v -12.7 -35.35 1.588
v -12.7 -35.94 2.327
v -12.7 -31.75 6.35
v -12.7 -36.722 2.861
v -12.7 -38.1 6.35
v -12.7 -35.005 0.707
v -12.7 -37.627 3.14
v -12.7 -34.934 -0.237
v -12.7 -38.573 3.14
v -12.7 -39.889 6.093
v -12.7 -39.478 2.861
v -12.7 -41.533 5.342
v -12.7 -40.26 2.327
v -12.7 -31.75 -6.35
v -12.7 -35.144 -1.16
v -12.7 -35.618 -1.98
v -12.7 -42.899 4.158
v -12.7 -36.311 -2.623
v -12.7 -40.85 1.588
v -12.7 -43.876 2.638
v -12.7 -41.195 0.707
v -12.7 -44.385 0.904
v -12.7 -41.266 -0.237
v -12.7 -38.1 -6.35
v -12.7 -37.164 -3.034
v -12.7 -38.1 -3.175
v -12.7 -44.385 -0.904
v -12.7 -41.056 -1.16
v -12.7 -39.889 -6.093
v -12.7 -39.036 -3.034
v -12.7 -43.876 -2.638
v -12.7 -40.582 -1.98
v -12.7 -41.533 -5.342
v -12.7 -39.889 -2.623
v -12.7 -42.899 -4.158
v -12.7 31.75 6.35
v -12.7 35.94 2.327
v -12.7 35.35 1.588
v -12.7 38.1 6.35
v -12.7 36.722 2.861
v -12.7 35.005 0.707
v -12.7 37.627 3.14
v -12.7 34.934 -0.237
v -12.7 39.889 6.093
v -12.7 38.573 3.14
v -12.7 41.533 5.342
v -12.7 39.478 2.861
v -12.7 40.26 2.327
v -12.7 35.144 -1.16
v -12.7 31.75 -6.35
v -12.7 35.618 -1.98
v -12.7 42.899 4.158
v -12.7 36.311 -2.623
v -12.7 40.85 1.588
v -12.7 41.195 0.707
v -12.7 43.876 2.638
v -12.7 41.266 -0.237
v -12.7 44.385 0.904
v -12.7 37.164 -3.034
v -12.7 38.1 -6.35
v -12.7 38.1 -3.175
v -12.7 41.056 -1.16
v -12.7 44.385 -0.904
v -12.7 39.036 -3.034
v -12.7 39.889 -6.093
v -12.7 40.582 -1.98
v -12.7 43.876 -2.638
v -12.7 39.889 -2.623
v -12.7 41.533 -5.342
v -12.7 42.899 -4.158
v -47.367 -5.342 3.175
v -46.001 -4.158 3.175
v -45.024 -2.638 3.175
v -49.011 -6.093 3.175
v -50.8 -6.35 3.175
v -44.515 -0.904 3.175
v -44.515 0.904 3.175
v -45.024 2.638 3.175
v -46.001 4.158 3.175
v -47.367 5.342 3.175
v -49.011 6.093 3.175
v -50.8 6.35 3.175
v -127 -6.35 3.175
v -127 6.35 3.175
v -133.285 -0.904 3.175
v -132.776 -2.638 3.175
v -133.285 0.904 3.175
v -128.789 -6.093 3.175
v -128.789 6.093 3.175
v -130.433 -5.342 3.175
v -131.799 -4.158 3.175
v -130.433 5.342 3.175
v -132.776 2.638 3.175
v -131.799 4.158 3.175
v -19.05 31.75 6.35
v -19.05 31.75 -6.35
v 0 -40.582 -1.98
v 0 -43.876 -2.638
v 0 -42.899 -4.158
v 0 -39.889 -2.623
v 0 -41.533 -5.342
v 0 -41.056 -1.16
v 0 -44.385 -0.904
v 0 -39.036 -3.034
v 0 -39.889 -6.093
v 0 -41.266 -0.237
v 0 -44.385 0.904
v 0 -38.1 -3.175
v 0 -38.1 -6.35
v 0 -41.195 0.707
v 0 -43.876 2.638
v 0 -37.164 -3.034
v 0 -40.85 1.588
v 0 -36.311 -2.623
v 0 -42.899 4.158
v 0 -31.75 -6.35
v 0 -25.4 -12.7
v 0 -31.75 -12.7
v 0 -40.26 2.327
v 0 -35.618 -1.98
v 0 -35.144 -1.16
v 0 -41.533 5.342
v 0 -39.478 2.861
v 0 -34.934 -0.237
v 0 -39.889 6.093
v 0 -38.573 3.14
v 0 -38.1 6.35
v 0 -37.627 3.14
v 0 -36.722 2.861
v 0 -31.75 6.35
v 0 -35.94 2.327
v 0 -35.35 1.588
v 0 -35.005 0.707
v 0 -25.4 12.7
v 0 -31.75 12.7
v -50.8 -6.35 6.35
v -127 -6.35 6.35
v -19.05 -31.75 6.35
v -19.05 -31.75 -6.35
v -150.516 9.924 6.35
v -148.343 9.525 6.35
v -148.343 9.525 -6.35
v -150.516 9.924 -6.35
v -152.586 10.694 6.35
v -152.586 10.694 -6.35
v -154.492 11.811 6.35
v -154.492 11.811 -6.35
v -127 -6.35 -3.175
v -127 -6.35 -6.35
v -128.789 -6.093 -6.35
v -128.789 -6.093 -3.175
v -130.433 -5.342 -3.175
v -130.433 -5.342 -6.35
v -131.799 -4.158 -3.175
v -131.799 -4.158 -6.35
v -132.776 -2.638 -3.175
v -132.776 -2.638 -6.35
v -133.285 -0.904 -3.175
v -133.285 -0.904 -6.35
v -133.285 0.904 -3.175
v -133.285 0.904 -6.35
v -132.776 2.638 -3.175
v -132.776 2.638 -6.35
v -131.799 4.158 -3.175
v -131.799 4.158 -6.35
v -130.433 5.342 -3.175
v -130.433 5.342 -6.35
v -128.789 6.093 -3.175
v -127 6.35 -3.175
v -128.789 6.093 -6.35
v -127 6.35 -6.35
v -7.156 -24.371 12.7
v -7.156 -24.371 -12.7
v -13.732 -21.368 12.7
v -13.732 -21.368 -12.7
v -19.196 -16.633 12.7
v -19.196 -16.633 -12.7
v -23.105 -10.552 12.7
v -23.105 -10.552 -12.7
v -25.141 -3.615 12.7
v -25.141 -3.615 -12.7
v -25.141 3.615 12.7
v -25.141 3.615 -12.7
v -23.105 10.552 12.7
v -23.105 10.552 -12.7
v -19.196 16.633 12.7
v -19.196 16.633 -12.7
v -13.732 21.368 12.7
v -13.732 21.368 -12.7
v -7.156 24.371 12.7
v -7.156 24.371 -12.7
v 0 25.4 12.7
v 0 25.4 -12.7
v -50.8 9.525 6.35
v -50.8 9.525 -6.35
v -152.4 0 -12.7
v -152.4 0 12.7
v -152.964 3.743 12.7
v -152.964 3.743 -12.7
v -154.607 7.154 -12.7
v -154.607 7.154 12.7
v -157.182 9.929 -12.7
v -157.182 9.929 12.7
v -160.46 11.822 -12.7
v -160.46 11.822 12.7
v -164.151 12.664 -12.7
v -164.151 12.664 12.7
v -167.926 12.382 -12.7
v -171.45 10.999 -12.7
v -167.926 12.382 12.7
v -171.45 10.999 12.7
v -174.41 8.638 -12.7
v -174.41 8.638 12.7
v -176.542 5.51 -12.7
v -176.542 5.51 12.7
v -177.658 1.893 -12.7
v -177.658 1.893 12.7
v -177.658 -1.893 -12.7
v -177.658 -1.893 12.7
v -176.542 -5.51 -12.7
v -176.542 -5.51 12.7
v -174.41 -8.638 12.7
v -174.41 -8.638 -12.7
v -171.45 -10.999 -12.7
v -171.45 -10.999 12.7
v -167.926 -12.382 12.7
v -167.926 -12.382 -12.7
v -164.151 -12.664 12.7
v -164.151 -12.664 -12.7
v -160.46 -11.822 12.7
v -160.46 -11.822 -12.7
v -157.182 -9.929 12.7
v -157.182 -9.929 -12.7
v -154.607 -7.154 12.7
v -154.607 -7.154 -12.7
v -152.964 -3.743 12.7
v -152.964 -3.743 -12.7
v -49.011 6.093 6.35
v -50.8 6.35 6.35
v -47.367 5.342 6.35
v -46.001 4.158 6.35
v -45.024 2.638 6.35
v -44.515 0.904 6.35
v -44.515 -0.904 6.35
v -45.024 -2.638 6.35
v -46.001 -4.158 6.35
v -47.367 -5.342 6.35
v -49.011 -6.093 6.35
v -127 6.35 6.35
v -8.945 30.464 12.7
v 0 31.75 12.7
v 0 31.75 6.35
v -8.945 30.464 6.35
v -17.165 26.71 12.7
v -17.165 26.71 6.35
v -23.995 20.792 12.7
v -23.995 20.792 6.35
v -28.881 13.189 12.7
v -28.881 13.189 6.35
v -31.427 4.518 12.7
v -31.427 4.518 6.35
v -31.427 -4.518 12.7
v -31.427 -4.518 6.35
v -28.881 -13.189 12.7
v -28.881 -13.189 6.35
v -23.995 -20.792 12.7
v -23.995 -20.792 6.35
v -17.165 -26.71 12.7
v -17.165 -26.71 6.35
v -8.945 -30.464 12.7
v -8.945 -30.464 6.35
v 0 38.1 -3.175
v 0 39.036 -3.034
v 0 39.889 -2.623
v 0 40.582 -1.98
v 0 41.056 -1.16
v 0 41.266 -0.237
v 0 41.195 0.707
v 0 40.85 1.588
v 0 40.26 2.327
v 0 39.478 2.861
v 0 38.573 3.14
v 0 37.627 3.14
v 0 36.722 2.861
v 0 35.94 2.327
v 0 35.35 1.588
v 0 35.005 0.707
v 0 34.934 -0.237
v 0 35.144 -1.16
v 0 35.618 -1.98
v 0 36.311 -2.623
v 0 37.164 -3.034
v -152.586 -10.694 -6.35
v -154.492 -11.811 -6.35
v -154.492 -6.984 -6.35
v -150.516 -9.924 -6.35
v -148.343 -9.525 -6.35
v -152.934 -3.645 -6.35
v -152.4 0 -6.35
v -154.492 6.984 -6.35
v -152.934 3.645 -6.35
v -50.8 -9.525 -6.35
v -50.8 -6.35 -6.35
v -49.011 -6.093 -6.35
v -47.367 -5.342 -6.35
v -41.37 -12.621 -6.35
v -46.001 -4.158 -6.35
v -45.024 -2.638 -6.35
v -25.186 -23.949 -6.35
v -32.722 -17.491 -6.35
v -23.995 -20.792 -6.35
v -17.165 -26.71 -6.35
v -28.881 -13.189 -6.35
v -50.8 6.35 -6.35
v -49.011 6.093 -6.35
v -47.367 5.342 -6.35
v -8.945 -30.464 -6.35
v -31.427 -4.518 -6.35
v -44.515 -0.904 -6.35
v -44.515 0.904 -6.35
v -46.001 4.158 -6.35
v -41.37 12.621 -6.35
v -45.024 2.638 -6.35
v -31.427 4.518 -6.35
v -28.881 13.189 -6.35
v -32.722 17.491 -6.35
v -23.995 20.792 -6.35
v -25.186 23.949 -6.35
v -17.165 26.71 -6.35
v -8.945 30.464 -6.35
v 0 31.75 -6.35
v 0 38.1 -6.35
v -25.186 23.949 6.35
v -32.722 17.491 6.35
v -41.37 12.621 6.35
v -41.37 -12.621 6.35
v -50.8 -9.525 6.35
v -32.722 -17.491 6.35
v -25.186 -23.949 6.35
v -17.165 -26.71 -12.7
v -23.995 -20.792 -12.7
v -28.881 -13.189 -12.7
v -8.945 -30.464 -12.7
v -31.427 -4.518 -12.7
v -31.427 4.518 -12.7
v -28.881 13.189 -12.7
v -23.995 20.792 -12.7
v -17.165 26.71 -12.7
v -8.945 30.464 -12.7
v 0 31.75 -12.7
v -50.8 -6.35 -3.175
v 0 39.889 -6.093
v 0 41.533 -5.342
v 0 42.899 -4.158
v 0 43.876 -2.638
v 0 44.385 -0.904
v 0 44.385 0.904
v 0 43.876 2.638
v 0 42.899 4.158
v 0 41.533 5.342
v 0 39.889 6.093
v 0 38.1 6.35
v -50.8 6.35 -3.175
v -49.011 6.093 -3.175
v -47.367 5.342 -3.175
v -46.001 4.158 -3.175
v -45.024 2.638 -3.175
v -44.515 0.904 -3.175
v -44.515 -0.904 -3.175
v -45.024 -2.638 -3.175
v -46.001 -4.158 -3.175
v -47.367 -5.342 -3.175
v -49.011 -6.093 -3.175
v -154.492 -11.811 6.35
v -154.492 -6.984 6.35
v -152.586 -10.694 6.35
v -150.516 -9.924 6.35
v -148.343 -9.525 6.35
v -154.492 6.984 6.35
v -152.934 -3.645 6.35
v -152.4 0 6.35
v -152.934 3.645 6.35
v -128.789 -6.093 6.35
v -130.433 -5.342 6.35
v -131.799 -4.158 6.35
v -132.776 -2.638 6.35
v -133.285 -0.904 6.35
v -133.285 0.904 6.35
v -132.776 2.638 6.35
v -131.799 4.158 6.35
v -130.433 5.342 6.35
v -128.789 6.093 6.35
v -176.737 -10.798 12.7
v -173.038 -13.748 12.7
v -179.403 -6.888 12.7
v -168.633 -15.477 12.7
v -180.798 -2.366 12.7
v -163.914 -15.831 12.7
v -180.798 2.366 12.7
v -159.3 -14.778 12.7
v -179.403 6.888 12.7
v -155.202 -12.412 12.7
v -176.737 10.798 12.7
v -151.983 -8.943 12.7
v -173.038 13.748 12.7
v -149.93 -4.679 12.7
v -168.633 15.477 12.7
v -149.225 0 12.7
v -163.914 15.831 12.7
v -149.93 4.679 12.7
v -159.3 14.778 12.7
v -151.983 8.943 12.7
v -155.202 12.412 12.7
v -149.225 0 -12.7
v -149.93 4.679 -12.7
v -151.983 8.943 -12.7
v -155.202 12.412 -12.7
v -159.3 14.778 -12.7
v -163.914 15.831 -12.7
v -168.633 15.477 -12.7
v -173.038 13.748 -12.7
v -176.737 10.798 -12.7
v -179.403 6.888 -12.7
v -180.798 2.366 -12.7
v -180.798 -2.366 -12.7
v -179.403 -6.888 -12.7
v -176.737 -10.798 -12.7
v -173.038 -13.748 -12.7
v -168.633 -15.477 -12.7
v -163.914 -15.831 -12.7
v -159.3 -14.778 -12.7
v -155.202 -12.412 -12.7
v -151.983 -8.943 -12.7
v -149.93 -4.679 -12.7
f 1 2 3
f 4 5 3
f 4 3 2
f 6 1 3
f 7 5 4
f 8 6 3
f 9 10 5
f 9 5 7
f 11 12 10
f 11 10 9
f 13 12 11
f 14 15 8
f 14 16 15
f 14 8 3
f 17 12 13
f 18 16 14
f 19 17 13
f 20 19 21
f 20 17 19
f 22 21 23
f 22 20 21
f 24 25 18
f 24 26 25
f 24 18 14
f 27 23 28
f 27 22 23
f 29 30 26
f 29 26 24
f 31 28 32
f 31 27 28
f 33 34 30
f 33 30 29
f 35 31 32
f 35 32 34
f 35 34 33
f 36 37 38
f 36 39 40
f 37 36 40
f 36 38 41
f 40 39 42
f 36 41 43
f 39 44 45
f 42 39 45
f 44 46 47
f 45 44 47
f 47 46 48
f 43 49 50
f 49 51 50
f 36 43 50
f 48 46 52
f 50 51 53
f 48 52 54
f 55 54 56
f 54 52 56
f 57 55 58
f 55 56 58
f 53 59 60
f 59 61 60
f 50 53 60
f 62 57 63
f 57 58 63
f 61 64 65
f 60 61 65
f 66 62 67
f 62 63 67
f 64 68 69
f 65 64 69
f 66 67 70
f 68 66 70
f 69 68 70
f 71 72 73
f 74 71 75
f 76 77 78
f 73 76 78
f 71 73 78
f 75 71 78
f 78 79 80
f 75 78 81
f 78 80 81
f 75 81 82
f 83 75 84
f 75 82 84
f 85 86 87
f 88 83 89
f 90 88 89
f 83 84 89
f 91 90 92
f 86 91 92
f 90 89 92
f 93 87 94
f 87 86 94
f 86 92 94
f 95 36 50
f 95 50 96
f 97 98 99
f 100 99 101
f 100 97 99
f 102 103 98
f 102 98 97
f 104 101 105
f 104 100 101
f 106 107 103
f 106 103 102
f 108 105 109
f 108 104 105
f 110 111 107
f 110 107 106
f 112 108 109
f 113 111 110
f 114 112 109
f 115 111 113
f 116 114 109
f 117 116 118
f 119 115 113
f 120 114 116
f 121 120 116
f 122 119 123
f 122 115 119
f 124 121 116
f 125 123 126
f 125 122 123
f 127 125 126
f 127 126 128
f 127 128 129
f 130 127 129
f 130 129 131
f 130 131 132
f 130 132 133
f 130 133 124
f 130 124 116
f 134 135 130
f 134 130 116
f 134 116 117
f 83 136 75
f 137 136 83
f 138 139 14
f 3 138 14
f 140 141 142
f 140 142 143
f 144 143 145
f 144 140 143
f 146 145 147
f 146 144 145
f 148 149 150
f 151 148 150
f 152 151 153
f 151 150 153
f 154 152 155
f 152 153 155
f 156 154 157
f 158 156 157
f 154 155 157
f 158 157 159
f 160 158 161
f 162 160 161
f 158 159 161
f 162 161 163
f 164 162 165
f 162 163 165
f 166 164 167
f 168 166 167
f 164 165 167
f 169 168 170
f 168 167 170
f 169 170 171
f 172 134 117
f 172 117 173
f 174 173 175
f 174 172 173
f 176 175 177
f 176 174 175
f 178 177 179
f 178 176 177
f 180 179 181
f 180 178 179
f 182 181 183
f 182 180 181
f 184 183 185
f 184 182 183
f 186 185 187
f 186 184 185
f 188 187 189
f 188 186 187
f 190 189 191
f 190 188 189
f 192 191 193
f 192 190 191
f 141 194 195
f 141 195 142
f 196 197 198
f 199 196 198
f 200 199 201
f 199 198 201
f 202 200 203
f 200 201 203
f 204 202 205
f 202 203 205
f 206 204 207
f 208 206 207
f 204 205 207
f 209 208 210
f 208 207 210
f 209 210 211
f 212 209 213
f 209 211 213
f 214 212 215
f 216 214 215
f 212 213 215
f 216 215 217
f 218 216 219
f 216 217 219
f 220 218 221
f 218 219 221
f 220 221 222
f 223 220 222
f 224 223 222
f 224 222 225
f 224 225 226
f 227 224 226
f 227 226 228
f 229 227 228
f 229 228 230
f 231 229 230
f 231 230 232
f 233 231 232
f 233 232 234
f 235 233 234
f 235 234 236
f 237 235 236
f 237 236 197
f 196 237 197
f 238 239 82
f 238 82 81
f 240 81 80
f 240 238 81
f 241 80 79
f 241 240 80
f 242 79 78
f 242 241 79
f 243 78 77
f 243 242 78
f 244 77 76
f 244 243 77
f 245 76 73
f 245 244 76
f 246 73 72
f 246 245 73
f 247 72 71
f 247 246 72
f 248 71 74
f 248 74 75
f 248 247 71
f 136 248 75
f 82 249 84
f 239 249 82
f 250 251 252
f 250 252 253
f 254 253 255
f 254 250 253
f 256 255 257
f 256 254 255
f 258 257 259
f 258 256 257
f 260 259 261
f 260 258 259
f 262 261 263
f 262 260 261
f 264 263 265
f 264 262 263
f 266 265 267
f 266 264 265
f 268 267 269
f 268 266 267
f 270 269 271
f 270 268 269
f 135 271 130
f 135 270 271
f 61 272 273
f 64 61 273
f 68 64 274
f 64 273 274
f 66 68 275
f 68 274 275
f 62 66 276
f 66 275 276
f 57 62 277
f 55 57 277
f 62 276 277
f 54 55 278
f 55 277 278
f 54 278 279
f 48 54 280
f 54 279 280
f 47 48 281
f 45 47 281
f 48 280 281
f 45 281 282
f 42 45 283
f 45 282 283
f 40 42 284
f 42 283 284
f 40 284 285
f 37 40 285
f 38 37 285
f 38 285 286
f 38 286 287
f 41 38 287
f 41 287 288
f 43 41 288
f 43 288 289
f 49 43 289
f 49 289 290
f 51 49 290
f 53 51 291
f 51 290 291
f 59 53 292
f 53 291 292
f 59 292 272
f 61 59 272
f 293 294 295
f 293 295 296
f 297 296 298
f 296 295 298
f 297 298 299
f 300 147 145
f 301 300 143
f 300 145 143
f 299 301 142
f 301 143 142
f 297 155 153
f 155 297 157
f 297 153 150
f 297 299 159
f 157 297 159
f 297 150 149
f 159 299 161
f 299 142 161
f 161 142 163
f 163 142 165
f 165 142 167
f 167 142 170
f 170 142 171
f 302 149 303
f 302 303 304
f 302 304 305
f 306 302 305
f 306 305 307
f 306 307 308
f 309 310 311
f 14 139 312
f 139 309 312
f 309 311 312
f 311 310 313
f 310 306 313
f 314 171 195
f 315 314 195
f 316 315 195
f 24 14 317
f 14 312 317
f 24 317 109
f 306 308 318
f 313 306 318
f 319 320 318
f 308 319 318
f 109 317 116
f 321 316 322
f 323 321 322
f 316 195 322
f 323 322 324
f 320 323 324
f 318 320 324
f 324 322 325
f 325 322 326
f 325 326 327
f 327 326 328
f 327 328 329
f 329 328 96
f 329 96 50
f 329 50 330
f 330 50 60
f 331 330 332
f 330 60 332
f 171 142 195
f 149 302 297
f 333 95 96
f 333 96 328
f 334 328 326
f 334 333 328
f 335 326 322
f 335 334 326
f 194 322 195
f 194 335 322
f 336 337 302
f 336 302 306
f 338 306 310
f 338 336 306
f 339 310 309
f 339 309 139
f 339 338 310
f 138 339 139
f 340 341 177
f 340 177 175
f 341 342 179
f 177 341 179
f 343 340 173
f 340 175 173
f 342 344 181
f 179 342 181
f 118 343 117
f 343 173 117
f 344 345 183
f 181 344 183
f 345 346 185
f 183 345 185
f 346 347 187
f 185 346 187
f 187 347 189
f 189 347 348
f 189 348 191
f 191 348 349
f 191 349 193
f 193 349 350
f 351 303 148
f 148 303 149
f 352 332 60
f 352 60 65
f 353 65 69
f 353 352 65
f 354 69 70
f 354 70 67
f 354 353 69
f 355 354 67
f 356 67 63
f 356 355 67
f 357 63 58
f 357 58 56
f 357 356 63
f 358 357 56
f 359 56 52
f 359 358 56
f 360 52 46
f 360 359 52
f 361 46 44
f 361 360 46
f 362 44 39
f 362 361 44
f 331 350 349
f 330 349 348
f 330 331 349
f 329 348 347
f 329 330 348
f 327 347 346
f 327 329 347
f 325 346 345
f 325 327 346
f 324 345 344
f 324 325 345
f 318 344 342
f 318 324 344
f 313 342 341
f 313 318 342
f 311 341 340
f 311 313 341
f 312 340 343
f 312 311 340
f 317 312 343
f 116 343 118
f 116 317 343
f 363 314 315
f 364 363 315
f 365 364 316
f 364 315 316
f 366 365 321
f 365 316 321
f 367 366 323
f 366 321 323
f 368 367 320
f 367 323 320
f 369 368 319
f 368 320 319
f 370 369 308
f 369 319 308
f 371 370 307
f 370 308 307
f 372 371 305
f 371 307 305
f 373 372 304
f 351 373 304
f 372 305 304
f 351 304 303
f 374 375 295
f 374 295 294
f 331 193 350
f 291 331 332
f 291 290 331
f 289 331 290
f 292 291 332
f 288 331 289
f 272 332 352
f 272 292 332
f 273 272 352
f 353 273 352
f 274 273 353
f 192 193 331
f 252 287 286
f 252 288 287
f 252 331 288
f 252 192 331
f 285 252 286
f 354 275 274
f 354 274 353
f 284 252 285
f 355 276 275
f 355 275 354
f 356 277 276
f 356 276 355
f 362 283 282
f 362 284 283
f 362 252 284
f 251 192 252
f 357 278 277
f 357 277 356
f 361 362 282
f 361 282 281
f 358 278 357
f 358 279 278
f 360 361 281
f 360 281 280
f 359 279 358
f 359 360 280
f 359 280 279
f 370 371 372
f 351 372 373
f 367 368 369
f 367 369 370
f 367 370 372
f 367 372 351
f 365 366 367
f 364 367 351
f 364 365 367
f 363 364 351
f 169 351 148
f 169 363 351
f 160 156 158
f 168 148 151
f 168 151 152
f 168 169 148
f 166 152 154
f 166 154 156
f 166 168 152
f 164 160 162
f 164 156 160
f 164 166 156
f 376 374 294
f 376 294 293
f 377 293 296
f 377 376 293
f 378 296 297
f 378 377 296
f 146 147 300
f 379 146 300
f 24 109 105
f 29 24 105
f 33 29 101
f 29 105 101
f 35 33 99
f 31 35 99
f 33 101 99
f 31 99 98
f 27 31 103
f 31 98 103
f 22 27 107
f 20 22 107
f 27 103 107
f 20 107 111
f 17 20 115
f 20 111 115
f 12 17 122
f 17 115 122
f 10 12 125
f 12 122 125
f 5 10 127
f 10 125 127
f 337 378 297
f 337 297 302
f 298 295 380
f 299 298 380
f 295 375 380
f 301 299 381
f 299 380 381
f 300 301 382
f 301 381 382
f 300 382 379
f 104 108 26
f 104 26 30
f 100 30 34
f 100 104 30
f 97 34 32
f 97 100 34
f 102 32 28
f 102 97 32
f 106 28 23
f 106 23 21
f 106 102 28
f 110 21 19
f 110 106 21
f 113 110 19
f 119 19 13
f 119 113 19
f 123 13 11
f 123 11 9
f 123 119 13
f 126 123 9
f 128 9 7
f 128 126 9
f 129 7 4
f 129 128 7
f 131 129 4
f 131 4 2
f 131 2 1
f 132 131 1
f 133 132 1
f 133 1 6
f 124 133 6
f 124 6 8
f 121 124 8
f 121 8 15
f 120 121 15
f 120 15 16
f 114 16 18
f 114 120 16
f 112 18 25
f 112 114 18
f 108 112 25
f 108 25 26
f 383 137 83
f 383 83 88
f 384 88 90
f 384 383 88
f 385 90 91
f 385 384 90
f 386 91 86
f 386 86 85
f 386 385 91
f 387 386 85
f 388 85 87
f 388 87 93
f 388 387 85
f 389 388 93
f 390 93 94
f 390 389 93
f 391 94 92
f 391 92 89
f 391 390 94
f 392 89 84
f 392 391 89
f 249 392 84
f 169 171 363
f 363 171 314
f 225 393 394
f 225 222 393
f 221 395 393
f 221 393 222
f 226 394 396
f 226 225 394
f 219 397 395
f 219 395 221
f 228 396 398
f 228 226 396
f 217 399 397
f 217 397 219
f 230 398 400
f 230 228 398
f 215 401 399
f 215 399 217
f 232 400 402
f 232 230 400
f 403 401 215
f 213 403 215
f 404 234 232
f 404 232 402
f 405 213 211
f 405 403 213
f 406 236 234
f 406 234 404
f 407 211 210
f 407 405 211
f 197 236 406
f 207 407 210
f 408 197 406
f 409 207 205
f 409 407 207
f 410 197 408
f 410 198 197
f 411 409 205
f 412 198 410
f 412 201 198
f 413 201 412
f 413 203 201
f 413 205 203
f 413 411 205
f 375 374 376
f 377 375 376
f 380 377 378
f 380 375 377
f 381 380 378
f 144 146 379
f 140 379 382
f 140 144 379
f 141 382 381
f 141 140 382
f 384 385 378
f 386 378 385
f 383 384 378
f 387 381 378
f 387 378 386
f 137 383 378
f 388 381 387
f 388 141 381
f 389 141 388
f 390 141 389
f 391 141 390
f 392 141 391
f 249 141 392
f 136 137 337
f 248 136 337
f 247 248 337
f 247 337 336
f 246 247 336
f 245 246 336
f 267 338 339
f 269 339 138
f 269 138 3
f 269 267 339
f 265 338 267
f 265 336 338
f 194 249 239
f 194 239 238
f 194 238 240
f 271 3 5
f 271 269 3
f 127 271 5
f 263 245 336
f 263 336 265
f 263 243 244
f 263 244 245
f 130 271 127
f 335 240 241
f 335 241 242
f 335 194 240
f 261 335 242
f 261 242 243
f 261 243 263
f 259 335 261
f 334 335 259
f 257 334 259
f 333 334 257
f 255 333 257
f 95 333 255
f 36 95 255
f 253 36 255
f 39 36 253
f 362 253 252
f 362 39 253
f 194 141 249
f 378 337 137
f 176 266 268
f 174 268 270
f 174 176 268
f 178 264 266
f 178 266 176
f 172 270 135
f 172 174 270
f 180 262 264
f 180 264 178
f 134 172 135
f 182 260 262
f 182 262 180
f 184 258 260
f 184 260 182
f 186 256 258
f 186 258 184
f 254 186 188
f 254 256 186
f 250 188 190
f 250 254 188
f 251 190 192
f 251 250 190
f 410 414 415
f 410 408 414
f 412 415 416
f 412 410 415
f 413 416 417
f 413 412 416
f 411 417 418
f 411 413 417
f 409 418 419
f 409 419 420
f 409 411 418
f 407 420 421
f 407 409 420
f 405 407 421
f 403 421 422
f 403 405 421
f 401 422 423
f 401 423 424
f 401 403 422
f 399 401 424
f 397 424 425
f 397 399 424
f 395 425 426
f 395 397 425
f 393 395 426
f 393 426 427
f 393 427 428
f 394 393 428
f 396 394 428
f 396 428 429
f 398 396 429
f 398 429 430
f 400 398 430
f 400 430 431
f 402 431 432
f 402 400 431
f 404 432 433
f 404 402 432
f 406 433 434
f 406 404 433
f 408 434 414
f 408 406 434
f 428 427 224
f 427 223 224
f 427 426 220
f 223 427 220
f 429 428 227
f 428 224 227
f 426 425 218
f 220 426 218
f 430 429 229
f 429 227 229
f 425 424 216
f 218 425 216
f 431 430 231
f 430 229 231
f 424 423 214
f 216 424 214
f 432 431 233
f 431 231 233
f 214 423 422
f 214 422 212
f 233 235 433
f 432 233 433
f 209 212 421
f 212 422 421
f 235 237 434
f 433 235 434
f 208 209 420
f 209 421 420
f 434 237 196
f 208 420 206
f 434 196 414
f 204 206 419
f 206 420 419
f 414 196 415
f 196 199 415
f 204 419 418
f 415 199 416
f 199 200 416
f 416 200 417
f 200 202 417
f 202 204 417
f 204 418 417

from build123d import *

# Parameters (mm, degrees)
SKETCH2_R             = 31.75
BOSS_EXTRUDE2_DEPTH   = 12.7
SKETCH2_R_2           = 15.875
BOSS_EXTRUDE2_2_DEPTH = 12.7
BOSS_EXTRUDE3_START   = -6.35
BOSS_EXTRUDE3_DEPTH   = 12.7
CUT_EXTRUDE1_DEPTH    = 3.175
SKETCH5_R             = 12.7
CUT_EXTRUDE2_DEPTH    = 26.4
BOSS_EXTRUDE4_DEPTH   = 12.7
SKETCH7_R             = 3.175
CUT_EXTRUDE3_DEPTH    = 12.7


with BuildPart() as part:
    # Sketch2 → Boss-Extrude2 (new body, symmetric)
    with BuildSketch(Plane.XY):
        Circle(SKETCH2_R)
    extrude(amount=BOSS_EXTRUDE2_DEPTH, both=True)


with BuildPart() as body_2:
    # Sketch2 → Boss-Extrude2 2 (new body, symmetric)
    with BuildSketch(Plane.XY):
        with Locations((-165.1, 0)):
            Circle(SKETCH2_R_2)
    extrude(amount=BOSS_EXTRUDE2_2_DEPTH, both=True)


with BuildPart() as body_3:
    # Sketch3 → Boss-Extrude3 (new body)
    with BuildSketch(Plane.XY.offset(12.7).offset(BOSS_EXTRUDE3_START)):
        with BuildLine():
            Line((0, 31.75), (-19.05, 31.75))
            ThreePointArc((-19.05, 31.75), (-32.7222642, 17.490734571), (-50.8, 9.525))
            Line((-50.8, 9.525), (-148.343009524, 9.525))
            ThreePointArc((-148.343009524, 9.525), (-151.567861624, 10.263966545), (-154.492422733, 11.810797159))
            Line((-154.492422733, 11.810797159), (-154.492422733, -11.810797159))
            ThreePointArc((-154.492422733, -11.810797159), (-151.567861624, -10.263966545), (-148.343009524, -9.525))
            Line((-148.343009524, -9.525), (-50.8, -9.525))
            ThreePointArc((-50.8, -9.525), (-32.7222642, -17.490734571), (-19.05, -31.75))
            Line((-19.05, -31.75), (0, -31.75))
            Line((0, -31.75), (0, 31.75))
        make_face()
    extrude(amount=-BOSS_EXTRUDE3_DEPTH)

    # Sketch4 → Cut-Extrude1 (cut)
    with BuildSketch(Plane.XY.offset(6.35)):
        with BuildLine():
            Line((-127, 6.35), (-50.8, 6.35))
            ThreePointArc((-50.8, 6.35), (-44.45, 0), (-50.8, -6.35))
            Line((-50.8, -6.35), (-127, -6.35))
            ThreePointArc((-127, -6.35), (-133.35, 0), (-127, 6.35))
        make_face()
    cut_extrude1 = extrude(amount=-CUT_EXTRUDE1_DEPTH, mode=Mode.SUBTRACT)

    # Mirror1: Cut-Extrude1 across plane
    add(cut_extrude1.mirror(Plane.XY), mode=Mode.SUBTRACT)


with BuildPart() as cut_extrude2_tool:
    # Sketch5 → Cut-Extrude2 (new body, through all)
    with BuildSketch(Plane.XY.offset(12.7)):
        with Locations((-165.1, 0)):
            Circle(SKETCH5_R)
        with BuildLine():
            Line((0, 31.75), (33.396136352, 31.75))
            Line((33.396136352, 31.75), (33.396136352, -31.75))
            Line((33.396136352, -31.75), (0, -31.75))
            Line((0, -31.75), (0, -25.4))
            ThreePointArc((0, -25.4), (-25.4, 0), (0, 25.4))
            Line((0, 25.4), (0, 31.75))
        make_face()
    extrude(amount=-CUT_EXTRUDE2_DEPTH)


with BuildPart() as part_1:
    add(part.part)

    # Cut-Extrude2: cut by cut_extrude2_tool
    add(cut_extrude2_tool.part, mode=Mode.SUBTRACT)



with BuildPart() as body_2_1:
    add(body_2.part)

    # Cut-Extrude2: cut by cut_extrude2_tool
    add(cut_extrude2_tool.part, mode=Mode.SUBTRACT)


with BuildPart() as body_3_1:
    add(body_3.part)

    # Cut-Extrude2: cut by cut_extrude2_tool
    add(cut_extrude2_tool.part, mode=Mode.SUBTRACT)


with BuildPart() as part_2:
    add(part_1.part)

    add(body_3_1.part)  # Boss-Extrude4 merges body 3
    # Sketch6 → Boss-Extrude4 (add)
    with BuildSketch(Plane(origin=(0, 0, 0), x_dir=(0, 0, -1), z_dir=(1, 0, 0))):
        with BuildLine():
            Line((-6.35, 25.4), (6.35, 25.4))
            Line((6.35, 25.4), (6.35, 38.1))
            ThreePointArc((6.35, 38.1), (0, 44.45), (-6.35, 38.1))
            Line((-6.35, 38.1), (-6.35, 25.4))
        make_face()
    boss_extrude4 = extrude(amount=-BOSS_EXTRUDE4_DEPTH)

    # Mirror2: Boss-Extrude4 across plane
    add(boss_extrude4.mirror(Plane.ZX))

    # Sketch7 → Cut-Extrude3 (cut)
    with BuildSketch(Plane(origin=(0, 0, 0), x_dir=(0, 0, -1), z_dir=(1, 0, 0))):
        with Locations((0, 38.1)):
            Circle(SKETCH7_R)
    cut_extrude3 = extrude(amount=-CUT_EXTRUDE3_DEPTH, mode=Mode.SUBTRACT)

    # Mirror3: Cut-Extrude3 across plane
    add(cut_extrude3.mirror(Plane.ZX), mode=Mode.SUBTRACT)


solid = Compound([body_2_1.part, part_2.part])
